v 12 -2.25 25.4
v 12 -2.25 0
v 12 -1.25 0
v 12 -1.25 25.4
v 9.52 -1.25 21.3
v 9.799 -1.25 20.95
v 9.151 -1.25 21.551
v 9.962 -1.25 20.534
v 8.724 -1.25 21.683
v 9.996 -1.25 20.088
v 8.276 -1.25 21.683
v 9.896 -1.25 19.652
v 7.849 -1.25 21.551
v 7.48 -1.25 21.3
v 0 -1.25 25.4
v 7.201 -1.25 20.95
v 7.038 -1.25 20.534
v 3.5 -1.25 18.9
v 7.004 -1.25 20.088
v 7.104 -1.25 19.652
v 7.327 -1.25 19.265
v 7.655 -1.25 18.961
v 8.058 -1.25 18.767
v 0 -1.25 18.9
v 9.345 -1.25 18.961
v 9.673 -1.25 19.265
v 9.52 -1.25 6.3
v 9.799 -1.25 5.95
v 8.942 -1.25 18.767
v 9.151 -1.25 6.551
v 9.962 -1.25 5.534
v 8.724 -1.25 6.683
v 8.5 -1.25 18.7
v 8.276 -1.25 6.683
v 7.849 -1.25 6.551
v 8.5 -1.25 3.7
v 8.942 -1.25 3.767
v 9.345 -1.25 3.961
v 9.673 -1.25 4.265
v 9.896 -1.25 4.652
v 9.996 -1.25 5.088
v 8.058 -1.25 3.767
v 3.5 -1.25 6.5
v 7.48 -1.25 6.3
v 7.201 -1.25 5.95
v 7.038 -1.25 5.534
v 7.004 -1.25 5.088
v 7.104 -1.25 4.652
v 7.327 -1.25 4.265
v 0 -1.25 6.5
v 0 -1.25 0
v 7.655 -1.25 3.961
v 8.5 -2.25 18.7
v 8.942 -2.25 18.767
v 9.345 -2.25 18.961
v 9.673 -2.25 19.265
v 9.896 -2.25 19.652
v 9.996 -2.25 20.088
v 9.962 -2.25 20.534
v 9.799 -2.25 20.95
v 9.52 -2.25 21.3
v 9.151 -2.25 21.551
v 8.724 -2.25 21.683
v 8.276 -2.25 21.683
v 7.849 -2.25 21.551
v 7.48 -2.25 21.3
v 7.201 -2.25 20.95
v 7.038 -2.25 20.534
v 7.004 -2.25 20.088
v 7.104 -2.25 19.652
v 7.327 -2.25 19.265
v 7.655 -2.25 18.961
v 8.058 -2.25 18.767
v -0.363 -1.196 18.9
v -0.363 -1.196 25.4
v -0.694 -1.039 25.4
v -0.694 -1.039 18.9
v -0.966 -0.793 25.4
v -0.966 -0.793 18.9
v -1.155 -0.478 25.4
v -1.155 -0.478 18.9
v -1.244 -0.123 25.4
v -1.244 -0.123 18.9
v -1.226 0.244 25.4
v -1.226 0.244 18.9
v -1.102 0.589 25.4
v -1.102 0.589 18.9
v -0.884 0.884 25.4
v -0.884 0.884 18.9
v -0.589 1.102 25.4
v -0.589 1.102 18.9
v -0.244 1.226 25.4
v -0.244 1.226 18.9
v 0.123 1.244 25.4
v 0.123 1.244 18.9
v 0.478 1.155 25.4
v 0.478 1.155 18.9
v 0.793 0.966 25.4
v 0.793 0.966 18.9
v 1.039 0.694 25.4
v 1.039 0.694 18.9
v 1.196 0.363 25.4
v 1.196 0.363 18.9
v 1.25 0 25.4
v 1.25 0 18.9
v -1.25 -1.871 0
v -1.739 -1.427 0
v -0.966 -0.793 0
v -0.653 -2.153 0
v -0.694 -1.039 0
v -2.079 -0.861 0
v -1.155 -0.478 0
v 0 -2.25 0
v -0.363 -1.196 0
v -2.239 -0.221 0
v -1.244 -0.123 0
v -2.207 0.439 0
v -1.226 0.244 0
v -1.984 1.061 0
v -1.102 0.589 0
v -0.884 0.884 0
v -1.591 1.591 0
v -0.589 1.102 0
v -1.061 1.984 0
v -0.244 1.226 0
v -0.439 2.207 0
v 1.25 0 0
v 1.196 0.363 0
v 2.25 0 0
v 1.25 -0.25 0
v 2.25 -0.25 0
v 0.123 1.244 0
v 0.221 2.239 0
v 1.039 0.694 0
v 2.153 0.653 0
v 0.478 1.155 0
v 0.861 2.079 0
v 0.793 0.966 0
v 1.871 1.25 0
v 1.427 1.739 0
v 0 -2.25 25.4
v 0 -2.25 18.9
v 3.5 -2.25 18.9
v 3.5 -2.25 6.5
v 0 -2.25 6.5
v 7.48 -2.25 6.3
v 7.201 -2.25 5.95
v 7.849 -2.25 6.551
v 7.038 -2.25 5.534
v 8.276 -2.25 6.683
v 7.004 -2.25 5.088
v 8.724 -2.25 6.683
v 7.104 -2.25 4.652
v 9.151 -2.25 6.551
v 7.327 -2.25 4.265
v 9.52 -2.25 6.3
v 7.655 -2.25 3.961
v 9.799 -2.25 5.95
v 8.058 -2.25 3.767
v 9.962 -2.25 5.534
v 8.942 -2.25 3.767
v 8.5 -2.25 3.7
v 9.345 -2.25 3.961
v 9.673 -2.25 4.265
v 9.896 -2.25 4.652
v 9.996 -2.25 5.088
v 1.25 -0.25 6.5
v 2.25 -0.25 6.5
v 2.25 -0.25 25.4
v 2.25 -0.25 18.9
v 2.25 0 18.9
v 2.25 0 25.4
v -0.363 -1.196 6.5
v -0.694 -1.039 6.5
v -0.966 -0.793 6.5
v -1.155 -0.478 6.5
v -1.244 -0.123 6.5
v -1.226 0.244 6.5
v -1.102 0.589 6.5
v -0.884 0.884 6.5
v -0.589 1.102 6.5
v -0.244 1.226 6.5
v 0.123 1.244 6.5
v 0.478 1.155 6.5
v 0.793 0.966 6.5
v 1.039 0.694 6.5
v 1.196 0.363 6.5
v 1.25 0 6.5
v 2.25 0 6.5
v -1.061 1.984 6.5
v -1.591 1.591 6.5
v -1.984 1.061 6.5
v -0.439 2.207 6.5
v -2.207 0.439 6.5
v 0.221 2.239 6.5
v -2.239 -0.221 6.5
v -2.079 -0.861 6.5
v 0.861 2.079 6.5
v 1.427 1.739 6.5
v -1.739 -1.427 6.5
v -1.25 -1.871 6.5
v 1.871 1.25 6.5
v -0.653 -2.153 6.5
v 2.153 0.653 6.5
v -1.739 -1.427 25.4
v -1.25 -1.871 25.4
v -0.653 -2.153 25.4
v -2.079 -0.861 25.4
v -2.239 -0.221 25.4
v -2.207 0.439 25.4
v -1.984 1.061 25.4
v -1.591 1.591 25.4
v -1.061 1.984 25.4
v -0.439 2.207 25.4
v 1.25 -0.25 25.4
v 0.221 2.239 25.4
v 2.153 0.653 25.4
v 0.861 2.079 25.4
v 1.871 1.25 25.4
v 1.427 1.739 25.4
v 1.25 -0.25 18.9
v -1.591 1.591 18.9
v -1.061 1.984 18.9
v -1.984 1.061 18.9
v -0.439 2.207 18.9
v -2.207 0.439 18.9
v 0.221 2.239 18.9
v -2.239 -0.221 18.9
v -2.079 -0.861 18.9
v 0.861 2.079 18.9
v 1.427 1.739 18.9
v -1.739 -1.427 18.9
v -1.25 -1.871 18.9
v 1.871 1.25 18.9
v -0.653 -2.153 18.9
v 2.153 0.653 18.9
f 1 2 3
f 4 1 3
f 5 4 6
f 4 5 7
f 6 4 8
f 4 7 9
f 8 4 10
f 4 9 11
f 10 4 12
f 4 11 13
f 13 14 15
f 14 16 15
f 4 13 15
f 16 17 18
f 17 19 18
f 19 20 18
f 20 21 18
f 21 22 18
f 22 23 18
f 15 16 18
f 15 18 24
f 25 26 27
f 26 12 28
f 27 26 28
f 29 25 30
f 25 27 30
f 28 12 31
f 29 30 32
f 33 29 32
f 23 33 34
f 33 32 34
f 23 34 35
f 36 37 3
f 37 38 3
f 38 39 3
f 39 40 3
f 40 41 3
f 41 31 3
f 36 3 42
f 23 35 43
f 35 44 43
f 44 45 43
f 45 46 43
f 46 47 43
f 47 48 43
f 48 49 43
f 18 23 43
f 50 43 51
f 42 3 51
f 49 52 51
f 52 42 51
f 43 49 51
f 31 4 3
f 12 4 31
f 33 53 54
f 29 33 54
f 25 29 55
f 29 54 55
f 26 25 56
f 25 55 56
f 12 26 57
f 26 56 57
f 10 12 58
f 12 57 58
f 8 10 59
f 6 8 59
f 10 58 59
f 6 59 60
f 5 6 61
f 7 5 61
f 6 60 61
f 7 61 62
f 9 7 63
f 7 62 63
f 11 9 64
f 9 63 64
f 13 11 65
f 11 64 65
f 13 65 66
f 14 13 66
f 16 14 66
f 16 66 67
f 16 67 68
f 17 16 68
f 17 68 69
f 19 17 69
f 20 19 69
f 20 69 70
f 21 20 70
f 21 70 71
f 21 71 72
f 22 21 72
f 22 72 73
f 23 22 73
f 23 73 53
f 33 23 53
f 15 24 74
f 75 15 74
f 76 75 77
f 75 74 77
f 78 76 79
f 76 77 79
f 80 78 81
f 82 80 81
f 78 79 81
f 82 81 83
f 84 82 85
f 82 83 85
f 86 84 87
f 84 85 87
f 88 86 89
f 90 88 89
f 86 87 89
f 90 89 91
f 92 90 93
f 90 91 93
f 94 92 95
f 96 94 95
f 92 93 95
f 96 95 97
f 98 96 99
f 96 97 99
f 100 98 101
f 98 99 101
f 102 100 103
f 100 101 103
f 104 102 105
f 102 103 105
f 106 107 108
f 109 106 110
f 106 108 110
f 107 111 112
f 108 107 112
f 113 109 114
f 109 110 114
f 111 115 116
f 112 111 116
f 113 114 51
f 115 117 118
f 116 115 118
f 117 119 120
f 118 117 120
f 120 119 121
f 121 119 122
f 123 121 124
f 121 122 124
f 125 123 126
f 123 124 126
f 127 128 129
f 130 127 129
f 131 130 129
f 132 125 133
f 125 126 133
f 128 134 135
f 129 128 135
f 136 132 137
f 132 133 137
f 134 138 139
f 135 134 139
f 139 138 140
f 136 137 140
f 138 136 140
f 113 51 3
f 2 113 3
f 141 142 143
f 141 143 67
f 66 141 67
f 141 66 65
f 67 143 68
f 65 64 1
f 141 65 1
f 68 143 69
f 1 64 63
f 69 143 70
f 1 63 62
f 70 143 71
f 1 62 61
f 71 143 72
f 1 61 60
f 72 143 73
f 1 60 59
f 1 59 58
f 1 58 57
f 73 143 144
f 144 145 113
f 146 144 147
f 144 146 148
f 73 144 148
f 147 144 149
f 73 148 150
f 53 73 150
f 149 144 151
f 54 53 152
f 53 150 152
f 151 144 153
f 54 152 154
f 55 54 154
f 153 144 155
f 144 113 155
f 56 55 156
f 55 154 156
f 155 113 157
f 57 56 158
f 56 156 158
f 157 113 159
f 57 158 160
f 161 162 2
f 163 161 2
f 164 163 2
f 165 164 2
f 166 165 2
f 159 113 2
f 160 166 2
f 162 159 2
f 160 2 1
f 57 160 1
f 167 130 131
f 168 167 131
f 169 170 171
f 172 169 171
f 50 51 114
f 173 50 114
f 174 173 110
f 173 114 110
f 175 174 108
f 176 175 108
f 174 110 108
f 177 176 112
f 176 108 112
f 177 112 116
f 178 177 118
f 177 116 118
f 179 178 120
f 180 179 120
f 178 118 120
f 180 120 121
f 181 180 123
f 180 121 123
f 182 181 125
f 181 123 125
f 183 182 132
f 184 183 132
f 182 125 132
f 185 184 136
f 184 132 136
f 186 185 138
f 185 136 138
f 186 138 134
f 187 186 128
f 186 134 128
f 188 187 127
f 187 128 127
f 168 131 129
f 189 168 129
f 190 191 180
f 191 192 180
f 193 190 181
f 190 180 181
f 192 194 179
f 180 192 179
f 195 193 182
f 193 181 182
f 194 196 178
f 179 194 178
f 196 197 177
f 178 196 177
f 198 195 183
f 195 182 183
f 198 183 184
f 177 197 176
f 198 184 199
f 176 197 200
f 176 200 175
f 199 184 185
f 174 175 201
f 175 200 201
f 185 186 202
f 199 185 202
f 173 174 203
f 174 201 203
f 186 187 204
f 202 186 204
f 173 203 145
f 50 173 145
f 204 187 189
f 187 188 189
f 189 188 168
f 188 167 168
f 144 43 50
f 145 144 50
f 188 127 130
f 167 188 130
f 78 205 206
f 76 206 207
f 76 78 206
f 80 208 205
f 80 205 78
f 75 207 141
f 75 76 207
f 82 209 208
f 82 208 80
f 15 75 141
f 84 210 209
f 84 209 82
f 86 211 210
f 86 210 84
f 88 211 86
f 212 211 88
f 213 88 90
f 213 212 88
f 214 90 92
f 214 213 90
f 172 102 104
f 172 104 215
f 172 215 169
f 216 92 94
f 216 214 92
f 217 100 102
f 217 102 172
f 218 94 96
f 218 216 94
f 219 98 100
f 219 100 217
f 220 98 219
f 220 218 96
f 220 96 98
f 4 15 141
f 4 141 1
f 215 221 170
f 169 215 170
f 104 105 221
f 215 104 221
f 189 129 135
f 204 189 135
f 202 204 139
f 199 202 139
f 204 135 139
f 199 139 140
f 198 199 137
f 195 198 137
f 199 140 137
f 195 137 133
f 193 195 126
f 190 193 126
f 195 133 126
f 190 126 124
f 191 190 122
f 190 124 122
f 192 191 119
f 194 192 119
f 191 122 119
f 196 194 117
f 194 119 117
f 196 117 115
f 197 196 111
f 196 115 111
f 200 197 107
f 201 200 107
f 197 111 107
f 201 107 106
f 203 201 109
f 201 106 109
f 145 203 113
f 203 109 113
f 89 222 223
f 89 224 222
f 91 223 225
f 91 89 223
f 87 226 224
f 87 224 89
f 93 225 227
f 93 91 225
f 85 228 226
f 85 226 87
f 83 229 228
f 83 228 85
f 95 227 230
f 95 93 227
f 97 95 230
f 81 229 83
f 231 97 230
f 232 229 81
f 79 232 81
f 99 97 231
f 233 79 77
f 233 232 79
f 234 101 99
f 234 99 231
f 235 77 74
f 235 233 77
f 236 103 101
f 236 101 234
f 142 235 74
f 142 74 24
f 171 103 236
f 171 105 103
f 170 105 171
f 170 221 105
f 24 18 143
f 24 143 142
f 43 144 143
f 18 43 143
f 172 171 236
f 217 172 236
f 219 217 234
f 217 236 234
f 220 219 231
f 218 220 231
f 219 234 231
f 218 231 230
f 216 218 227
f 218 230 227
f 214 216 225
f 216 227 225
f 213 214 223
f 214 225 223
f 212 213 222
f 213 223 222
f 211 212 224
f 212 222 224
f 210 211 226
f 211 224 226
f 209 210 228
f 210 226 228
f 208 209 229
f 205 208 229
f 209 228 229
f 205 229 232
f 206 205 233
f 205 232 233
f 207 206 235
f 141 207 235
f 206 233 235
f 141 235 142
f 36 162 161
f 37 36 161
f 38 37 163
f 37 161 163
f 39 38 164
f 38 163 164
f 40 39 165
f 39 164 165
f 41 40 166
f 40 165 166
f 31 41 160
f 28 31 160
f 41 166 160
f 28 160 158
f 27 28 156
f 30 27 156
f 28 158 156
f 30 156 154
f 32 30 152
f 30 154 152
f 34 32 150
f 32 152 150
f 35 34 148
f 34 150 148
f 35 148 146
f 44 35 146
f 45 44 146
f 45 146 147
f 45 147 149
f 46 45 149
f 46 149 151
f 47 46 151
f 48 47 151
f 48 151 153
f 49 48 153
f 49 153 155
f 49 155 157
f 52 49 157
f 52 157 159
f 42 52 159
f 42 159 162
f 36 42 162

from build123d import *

# Parameters (mm, degrees)
SALIENTE_EXTRUIR1_DEPTH = 25.4
CROQUIS4_R              = 1.5
CROQUIS4_W              = 5.75
CROQUIS4_H              = 12.4
CORTAR_EXTRUIR3_DEPTH   = 29.45013181


with BuildPart() as part:
    # Croquis1 → Saliente-Extruir1 (new body)
    with BuildSketch(Plane.XY):
        with BuildLine():
            Line((0, -2.25), (12, -2.25))
            Line((12, -2.25), (12, -1.25))
            Line((12, -1.25), (1.870828693, -1.25))
            Line((1.870828693, -1.25), (0, -1.25))
            ThreePointArc((0, -1.25), (-0.883883476, 0.883883476), (1.25, 0))
            Line((1.25, 0), (1.25, -0.25))
            Line((1.25, -0.25), (2.236067977, -0.25))
            Line((2.236067977, -0.25), (2.25, -0.25))
            Line((2.25, -0.25), (2.25, 0))
            ThreePointArc((2.25, 0), (-1.590990258, 1.590990258), (0, -2.25))
        make_face()
    extrude(amount=SALIENTE_EXTRUIR1_DEPTH)

    # Croquis4 → Cortar-Extruir3 (cut, through all)
    with BuildSketch(Plane.XZ.offset(2.25)):
        with Locations(Location((8.5, 20.2, 0), (0, 0, 270))):
            Circle(CROQUIS4_R)
        with Locations(Location((8.5, 5.2, 0), (0, 0, 270))):
            Circle(CROQUIS4_R)
        with Locations((0.625, 12.7)):
            Rectangle(CROQUIS4_W, CROQUIS4_H)
    extrude(amount=-CORTAR_EXTRUIR3_DEPTH, mode=Mode.SUBTRACT)


solid = part.part
